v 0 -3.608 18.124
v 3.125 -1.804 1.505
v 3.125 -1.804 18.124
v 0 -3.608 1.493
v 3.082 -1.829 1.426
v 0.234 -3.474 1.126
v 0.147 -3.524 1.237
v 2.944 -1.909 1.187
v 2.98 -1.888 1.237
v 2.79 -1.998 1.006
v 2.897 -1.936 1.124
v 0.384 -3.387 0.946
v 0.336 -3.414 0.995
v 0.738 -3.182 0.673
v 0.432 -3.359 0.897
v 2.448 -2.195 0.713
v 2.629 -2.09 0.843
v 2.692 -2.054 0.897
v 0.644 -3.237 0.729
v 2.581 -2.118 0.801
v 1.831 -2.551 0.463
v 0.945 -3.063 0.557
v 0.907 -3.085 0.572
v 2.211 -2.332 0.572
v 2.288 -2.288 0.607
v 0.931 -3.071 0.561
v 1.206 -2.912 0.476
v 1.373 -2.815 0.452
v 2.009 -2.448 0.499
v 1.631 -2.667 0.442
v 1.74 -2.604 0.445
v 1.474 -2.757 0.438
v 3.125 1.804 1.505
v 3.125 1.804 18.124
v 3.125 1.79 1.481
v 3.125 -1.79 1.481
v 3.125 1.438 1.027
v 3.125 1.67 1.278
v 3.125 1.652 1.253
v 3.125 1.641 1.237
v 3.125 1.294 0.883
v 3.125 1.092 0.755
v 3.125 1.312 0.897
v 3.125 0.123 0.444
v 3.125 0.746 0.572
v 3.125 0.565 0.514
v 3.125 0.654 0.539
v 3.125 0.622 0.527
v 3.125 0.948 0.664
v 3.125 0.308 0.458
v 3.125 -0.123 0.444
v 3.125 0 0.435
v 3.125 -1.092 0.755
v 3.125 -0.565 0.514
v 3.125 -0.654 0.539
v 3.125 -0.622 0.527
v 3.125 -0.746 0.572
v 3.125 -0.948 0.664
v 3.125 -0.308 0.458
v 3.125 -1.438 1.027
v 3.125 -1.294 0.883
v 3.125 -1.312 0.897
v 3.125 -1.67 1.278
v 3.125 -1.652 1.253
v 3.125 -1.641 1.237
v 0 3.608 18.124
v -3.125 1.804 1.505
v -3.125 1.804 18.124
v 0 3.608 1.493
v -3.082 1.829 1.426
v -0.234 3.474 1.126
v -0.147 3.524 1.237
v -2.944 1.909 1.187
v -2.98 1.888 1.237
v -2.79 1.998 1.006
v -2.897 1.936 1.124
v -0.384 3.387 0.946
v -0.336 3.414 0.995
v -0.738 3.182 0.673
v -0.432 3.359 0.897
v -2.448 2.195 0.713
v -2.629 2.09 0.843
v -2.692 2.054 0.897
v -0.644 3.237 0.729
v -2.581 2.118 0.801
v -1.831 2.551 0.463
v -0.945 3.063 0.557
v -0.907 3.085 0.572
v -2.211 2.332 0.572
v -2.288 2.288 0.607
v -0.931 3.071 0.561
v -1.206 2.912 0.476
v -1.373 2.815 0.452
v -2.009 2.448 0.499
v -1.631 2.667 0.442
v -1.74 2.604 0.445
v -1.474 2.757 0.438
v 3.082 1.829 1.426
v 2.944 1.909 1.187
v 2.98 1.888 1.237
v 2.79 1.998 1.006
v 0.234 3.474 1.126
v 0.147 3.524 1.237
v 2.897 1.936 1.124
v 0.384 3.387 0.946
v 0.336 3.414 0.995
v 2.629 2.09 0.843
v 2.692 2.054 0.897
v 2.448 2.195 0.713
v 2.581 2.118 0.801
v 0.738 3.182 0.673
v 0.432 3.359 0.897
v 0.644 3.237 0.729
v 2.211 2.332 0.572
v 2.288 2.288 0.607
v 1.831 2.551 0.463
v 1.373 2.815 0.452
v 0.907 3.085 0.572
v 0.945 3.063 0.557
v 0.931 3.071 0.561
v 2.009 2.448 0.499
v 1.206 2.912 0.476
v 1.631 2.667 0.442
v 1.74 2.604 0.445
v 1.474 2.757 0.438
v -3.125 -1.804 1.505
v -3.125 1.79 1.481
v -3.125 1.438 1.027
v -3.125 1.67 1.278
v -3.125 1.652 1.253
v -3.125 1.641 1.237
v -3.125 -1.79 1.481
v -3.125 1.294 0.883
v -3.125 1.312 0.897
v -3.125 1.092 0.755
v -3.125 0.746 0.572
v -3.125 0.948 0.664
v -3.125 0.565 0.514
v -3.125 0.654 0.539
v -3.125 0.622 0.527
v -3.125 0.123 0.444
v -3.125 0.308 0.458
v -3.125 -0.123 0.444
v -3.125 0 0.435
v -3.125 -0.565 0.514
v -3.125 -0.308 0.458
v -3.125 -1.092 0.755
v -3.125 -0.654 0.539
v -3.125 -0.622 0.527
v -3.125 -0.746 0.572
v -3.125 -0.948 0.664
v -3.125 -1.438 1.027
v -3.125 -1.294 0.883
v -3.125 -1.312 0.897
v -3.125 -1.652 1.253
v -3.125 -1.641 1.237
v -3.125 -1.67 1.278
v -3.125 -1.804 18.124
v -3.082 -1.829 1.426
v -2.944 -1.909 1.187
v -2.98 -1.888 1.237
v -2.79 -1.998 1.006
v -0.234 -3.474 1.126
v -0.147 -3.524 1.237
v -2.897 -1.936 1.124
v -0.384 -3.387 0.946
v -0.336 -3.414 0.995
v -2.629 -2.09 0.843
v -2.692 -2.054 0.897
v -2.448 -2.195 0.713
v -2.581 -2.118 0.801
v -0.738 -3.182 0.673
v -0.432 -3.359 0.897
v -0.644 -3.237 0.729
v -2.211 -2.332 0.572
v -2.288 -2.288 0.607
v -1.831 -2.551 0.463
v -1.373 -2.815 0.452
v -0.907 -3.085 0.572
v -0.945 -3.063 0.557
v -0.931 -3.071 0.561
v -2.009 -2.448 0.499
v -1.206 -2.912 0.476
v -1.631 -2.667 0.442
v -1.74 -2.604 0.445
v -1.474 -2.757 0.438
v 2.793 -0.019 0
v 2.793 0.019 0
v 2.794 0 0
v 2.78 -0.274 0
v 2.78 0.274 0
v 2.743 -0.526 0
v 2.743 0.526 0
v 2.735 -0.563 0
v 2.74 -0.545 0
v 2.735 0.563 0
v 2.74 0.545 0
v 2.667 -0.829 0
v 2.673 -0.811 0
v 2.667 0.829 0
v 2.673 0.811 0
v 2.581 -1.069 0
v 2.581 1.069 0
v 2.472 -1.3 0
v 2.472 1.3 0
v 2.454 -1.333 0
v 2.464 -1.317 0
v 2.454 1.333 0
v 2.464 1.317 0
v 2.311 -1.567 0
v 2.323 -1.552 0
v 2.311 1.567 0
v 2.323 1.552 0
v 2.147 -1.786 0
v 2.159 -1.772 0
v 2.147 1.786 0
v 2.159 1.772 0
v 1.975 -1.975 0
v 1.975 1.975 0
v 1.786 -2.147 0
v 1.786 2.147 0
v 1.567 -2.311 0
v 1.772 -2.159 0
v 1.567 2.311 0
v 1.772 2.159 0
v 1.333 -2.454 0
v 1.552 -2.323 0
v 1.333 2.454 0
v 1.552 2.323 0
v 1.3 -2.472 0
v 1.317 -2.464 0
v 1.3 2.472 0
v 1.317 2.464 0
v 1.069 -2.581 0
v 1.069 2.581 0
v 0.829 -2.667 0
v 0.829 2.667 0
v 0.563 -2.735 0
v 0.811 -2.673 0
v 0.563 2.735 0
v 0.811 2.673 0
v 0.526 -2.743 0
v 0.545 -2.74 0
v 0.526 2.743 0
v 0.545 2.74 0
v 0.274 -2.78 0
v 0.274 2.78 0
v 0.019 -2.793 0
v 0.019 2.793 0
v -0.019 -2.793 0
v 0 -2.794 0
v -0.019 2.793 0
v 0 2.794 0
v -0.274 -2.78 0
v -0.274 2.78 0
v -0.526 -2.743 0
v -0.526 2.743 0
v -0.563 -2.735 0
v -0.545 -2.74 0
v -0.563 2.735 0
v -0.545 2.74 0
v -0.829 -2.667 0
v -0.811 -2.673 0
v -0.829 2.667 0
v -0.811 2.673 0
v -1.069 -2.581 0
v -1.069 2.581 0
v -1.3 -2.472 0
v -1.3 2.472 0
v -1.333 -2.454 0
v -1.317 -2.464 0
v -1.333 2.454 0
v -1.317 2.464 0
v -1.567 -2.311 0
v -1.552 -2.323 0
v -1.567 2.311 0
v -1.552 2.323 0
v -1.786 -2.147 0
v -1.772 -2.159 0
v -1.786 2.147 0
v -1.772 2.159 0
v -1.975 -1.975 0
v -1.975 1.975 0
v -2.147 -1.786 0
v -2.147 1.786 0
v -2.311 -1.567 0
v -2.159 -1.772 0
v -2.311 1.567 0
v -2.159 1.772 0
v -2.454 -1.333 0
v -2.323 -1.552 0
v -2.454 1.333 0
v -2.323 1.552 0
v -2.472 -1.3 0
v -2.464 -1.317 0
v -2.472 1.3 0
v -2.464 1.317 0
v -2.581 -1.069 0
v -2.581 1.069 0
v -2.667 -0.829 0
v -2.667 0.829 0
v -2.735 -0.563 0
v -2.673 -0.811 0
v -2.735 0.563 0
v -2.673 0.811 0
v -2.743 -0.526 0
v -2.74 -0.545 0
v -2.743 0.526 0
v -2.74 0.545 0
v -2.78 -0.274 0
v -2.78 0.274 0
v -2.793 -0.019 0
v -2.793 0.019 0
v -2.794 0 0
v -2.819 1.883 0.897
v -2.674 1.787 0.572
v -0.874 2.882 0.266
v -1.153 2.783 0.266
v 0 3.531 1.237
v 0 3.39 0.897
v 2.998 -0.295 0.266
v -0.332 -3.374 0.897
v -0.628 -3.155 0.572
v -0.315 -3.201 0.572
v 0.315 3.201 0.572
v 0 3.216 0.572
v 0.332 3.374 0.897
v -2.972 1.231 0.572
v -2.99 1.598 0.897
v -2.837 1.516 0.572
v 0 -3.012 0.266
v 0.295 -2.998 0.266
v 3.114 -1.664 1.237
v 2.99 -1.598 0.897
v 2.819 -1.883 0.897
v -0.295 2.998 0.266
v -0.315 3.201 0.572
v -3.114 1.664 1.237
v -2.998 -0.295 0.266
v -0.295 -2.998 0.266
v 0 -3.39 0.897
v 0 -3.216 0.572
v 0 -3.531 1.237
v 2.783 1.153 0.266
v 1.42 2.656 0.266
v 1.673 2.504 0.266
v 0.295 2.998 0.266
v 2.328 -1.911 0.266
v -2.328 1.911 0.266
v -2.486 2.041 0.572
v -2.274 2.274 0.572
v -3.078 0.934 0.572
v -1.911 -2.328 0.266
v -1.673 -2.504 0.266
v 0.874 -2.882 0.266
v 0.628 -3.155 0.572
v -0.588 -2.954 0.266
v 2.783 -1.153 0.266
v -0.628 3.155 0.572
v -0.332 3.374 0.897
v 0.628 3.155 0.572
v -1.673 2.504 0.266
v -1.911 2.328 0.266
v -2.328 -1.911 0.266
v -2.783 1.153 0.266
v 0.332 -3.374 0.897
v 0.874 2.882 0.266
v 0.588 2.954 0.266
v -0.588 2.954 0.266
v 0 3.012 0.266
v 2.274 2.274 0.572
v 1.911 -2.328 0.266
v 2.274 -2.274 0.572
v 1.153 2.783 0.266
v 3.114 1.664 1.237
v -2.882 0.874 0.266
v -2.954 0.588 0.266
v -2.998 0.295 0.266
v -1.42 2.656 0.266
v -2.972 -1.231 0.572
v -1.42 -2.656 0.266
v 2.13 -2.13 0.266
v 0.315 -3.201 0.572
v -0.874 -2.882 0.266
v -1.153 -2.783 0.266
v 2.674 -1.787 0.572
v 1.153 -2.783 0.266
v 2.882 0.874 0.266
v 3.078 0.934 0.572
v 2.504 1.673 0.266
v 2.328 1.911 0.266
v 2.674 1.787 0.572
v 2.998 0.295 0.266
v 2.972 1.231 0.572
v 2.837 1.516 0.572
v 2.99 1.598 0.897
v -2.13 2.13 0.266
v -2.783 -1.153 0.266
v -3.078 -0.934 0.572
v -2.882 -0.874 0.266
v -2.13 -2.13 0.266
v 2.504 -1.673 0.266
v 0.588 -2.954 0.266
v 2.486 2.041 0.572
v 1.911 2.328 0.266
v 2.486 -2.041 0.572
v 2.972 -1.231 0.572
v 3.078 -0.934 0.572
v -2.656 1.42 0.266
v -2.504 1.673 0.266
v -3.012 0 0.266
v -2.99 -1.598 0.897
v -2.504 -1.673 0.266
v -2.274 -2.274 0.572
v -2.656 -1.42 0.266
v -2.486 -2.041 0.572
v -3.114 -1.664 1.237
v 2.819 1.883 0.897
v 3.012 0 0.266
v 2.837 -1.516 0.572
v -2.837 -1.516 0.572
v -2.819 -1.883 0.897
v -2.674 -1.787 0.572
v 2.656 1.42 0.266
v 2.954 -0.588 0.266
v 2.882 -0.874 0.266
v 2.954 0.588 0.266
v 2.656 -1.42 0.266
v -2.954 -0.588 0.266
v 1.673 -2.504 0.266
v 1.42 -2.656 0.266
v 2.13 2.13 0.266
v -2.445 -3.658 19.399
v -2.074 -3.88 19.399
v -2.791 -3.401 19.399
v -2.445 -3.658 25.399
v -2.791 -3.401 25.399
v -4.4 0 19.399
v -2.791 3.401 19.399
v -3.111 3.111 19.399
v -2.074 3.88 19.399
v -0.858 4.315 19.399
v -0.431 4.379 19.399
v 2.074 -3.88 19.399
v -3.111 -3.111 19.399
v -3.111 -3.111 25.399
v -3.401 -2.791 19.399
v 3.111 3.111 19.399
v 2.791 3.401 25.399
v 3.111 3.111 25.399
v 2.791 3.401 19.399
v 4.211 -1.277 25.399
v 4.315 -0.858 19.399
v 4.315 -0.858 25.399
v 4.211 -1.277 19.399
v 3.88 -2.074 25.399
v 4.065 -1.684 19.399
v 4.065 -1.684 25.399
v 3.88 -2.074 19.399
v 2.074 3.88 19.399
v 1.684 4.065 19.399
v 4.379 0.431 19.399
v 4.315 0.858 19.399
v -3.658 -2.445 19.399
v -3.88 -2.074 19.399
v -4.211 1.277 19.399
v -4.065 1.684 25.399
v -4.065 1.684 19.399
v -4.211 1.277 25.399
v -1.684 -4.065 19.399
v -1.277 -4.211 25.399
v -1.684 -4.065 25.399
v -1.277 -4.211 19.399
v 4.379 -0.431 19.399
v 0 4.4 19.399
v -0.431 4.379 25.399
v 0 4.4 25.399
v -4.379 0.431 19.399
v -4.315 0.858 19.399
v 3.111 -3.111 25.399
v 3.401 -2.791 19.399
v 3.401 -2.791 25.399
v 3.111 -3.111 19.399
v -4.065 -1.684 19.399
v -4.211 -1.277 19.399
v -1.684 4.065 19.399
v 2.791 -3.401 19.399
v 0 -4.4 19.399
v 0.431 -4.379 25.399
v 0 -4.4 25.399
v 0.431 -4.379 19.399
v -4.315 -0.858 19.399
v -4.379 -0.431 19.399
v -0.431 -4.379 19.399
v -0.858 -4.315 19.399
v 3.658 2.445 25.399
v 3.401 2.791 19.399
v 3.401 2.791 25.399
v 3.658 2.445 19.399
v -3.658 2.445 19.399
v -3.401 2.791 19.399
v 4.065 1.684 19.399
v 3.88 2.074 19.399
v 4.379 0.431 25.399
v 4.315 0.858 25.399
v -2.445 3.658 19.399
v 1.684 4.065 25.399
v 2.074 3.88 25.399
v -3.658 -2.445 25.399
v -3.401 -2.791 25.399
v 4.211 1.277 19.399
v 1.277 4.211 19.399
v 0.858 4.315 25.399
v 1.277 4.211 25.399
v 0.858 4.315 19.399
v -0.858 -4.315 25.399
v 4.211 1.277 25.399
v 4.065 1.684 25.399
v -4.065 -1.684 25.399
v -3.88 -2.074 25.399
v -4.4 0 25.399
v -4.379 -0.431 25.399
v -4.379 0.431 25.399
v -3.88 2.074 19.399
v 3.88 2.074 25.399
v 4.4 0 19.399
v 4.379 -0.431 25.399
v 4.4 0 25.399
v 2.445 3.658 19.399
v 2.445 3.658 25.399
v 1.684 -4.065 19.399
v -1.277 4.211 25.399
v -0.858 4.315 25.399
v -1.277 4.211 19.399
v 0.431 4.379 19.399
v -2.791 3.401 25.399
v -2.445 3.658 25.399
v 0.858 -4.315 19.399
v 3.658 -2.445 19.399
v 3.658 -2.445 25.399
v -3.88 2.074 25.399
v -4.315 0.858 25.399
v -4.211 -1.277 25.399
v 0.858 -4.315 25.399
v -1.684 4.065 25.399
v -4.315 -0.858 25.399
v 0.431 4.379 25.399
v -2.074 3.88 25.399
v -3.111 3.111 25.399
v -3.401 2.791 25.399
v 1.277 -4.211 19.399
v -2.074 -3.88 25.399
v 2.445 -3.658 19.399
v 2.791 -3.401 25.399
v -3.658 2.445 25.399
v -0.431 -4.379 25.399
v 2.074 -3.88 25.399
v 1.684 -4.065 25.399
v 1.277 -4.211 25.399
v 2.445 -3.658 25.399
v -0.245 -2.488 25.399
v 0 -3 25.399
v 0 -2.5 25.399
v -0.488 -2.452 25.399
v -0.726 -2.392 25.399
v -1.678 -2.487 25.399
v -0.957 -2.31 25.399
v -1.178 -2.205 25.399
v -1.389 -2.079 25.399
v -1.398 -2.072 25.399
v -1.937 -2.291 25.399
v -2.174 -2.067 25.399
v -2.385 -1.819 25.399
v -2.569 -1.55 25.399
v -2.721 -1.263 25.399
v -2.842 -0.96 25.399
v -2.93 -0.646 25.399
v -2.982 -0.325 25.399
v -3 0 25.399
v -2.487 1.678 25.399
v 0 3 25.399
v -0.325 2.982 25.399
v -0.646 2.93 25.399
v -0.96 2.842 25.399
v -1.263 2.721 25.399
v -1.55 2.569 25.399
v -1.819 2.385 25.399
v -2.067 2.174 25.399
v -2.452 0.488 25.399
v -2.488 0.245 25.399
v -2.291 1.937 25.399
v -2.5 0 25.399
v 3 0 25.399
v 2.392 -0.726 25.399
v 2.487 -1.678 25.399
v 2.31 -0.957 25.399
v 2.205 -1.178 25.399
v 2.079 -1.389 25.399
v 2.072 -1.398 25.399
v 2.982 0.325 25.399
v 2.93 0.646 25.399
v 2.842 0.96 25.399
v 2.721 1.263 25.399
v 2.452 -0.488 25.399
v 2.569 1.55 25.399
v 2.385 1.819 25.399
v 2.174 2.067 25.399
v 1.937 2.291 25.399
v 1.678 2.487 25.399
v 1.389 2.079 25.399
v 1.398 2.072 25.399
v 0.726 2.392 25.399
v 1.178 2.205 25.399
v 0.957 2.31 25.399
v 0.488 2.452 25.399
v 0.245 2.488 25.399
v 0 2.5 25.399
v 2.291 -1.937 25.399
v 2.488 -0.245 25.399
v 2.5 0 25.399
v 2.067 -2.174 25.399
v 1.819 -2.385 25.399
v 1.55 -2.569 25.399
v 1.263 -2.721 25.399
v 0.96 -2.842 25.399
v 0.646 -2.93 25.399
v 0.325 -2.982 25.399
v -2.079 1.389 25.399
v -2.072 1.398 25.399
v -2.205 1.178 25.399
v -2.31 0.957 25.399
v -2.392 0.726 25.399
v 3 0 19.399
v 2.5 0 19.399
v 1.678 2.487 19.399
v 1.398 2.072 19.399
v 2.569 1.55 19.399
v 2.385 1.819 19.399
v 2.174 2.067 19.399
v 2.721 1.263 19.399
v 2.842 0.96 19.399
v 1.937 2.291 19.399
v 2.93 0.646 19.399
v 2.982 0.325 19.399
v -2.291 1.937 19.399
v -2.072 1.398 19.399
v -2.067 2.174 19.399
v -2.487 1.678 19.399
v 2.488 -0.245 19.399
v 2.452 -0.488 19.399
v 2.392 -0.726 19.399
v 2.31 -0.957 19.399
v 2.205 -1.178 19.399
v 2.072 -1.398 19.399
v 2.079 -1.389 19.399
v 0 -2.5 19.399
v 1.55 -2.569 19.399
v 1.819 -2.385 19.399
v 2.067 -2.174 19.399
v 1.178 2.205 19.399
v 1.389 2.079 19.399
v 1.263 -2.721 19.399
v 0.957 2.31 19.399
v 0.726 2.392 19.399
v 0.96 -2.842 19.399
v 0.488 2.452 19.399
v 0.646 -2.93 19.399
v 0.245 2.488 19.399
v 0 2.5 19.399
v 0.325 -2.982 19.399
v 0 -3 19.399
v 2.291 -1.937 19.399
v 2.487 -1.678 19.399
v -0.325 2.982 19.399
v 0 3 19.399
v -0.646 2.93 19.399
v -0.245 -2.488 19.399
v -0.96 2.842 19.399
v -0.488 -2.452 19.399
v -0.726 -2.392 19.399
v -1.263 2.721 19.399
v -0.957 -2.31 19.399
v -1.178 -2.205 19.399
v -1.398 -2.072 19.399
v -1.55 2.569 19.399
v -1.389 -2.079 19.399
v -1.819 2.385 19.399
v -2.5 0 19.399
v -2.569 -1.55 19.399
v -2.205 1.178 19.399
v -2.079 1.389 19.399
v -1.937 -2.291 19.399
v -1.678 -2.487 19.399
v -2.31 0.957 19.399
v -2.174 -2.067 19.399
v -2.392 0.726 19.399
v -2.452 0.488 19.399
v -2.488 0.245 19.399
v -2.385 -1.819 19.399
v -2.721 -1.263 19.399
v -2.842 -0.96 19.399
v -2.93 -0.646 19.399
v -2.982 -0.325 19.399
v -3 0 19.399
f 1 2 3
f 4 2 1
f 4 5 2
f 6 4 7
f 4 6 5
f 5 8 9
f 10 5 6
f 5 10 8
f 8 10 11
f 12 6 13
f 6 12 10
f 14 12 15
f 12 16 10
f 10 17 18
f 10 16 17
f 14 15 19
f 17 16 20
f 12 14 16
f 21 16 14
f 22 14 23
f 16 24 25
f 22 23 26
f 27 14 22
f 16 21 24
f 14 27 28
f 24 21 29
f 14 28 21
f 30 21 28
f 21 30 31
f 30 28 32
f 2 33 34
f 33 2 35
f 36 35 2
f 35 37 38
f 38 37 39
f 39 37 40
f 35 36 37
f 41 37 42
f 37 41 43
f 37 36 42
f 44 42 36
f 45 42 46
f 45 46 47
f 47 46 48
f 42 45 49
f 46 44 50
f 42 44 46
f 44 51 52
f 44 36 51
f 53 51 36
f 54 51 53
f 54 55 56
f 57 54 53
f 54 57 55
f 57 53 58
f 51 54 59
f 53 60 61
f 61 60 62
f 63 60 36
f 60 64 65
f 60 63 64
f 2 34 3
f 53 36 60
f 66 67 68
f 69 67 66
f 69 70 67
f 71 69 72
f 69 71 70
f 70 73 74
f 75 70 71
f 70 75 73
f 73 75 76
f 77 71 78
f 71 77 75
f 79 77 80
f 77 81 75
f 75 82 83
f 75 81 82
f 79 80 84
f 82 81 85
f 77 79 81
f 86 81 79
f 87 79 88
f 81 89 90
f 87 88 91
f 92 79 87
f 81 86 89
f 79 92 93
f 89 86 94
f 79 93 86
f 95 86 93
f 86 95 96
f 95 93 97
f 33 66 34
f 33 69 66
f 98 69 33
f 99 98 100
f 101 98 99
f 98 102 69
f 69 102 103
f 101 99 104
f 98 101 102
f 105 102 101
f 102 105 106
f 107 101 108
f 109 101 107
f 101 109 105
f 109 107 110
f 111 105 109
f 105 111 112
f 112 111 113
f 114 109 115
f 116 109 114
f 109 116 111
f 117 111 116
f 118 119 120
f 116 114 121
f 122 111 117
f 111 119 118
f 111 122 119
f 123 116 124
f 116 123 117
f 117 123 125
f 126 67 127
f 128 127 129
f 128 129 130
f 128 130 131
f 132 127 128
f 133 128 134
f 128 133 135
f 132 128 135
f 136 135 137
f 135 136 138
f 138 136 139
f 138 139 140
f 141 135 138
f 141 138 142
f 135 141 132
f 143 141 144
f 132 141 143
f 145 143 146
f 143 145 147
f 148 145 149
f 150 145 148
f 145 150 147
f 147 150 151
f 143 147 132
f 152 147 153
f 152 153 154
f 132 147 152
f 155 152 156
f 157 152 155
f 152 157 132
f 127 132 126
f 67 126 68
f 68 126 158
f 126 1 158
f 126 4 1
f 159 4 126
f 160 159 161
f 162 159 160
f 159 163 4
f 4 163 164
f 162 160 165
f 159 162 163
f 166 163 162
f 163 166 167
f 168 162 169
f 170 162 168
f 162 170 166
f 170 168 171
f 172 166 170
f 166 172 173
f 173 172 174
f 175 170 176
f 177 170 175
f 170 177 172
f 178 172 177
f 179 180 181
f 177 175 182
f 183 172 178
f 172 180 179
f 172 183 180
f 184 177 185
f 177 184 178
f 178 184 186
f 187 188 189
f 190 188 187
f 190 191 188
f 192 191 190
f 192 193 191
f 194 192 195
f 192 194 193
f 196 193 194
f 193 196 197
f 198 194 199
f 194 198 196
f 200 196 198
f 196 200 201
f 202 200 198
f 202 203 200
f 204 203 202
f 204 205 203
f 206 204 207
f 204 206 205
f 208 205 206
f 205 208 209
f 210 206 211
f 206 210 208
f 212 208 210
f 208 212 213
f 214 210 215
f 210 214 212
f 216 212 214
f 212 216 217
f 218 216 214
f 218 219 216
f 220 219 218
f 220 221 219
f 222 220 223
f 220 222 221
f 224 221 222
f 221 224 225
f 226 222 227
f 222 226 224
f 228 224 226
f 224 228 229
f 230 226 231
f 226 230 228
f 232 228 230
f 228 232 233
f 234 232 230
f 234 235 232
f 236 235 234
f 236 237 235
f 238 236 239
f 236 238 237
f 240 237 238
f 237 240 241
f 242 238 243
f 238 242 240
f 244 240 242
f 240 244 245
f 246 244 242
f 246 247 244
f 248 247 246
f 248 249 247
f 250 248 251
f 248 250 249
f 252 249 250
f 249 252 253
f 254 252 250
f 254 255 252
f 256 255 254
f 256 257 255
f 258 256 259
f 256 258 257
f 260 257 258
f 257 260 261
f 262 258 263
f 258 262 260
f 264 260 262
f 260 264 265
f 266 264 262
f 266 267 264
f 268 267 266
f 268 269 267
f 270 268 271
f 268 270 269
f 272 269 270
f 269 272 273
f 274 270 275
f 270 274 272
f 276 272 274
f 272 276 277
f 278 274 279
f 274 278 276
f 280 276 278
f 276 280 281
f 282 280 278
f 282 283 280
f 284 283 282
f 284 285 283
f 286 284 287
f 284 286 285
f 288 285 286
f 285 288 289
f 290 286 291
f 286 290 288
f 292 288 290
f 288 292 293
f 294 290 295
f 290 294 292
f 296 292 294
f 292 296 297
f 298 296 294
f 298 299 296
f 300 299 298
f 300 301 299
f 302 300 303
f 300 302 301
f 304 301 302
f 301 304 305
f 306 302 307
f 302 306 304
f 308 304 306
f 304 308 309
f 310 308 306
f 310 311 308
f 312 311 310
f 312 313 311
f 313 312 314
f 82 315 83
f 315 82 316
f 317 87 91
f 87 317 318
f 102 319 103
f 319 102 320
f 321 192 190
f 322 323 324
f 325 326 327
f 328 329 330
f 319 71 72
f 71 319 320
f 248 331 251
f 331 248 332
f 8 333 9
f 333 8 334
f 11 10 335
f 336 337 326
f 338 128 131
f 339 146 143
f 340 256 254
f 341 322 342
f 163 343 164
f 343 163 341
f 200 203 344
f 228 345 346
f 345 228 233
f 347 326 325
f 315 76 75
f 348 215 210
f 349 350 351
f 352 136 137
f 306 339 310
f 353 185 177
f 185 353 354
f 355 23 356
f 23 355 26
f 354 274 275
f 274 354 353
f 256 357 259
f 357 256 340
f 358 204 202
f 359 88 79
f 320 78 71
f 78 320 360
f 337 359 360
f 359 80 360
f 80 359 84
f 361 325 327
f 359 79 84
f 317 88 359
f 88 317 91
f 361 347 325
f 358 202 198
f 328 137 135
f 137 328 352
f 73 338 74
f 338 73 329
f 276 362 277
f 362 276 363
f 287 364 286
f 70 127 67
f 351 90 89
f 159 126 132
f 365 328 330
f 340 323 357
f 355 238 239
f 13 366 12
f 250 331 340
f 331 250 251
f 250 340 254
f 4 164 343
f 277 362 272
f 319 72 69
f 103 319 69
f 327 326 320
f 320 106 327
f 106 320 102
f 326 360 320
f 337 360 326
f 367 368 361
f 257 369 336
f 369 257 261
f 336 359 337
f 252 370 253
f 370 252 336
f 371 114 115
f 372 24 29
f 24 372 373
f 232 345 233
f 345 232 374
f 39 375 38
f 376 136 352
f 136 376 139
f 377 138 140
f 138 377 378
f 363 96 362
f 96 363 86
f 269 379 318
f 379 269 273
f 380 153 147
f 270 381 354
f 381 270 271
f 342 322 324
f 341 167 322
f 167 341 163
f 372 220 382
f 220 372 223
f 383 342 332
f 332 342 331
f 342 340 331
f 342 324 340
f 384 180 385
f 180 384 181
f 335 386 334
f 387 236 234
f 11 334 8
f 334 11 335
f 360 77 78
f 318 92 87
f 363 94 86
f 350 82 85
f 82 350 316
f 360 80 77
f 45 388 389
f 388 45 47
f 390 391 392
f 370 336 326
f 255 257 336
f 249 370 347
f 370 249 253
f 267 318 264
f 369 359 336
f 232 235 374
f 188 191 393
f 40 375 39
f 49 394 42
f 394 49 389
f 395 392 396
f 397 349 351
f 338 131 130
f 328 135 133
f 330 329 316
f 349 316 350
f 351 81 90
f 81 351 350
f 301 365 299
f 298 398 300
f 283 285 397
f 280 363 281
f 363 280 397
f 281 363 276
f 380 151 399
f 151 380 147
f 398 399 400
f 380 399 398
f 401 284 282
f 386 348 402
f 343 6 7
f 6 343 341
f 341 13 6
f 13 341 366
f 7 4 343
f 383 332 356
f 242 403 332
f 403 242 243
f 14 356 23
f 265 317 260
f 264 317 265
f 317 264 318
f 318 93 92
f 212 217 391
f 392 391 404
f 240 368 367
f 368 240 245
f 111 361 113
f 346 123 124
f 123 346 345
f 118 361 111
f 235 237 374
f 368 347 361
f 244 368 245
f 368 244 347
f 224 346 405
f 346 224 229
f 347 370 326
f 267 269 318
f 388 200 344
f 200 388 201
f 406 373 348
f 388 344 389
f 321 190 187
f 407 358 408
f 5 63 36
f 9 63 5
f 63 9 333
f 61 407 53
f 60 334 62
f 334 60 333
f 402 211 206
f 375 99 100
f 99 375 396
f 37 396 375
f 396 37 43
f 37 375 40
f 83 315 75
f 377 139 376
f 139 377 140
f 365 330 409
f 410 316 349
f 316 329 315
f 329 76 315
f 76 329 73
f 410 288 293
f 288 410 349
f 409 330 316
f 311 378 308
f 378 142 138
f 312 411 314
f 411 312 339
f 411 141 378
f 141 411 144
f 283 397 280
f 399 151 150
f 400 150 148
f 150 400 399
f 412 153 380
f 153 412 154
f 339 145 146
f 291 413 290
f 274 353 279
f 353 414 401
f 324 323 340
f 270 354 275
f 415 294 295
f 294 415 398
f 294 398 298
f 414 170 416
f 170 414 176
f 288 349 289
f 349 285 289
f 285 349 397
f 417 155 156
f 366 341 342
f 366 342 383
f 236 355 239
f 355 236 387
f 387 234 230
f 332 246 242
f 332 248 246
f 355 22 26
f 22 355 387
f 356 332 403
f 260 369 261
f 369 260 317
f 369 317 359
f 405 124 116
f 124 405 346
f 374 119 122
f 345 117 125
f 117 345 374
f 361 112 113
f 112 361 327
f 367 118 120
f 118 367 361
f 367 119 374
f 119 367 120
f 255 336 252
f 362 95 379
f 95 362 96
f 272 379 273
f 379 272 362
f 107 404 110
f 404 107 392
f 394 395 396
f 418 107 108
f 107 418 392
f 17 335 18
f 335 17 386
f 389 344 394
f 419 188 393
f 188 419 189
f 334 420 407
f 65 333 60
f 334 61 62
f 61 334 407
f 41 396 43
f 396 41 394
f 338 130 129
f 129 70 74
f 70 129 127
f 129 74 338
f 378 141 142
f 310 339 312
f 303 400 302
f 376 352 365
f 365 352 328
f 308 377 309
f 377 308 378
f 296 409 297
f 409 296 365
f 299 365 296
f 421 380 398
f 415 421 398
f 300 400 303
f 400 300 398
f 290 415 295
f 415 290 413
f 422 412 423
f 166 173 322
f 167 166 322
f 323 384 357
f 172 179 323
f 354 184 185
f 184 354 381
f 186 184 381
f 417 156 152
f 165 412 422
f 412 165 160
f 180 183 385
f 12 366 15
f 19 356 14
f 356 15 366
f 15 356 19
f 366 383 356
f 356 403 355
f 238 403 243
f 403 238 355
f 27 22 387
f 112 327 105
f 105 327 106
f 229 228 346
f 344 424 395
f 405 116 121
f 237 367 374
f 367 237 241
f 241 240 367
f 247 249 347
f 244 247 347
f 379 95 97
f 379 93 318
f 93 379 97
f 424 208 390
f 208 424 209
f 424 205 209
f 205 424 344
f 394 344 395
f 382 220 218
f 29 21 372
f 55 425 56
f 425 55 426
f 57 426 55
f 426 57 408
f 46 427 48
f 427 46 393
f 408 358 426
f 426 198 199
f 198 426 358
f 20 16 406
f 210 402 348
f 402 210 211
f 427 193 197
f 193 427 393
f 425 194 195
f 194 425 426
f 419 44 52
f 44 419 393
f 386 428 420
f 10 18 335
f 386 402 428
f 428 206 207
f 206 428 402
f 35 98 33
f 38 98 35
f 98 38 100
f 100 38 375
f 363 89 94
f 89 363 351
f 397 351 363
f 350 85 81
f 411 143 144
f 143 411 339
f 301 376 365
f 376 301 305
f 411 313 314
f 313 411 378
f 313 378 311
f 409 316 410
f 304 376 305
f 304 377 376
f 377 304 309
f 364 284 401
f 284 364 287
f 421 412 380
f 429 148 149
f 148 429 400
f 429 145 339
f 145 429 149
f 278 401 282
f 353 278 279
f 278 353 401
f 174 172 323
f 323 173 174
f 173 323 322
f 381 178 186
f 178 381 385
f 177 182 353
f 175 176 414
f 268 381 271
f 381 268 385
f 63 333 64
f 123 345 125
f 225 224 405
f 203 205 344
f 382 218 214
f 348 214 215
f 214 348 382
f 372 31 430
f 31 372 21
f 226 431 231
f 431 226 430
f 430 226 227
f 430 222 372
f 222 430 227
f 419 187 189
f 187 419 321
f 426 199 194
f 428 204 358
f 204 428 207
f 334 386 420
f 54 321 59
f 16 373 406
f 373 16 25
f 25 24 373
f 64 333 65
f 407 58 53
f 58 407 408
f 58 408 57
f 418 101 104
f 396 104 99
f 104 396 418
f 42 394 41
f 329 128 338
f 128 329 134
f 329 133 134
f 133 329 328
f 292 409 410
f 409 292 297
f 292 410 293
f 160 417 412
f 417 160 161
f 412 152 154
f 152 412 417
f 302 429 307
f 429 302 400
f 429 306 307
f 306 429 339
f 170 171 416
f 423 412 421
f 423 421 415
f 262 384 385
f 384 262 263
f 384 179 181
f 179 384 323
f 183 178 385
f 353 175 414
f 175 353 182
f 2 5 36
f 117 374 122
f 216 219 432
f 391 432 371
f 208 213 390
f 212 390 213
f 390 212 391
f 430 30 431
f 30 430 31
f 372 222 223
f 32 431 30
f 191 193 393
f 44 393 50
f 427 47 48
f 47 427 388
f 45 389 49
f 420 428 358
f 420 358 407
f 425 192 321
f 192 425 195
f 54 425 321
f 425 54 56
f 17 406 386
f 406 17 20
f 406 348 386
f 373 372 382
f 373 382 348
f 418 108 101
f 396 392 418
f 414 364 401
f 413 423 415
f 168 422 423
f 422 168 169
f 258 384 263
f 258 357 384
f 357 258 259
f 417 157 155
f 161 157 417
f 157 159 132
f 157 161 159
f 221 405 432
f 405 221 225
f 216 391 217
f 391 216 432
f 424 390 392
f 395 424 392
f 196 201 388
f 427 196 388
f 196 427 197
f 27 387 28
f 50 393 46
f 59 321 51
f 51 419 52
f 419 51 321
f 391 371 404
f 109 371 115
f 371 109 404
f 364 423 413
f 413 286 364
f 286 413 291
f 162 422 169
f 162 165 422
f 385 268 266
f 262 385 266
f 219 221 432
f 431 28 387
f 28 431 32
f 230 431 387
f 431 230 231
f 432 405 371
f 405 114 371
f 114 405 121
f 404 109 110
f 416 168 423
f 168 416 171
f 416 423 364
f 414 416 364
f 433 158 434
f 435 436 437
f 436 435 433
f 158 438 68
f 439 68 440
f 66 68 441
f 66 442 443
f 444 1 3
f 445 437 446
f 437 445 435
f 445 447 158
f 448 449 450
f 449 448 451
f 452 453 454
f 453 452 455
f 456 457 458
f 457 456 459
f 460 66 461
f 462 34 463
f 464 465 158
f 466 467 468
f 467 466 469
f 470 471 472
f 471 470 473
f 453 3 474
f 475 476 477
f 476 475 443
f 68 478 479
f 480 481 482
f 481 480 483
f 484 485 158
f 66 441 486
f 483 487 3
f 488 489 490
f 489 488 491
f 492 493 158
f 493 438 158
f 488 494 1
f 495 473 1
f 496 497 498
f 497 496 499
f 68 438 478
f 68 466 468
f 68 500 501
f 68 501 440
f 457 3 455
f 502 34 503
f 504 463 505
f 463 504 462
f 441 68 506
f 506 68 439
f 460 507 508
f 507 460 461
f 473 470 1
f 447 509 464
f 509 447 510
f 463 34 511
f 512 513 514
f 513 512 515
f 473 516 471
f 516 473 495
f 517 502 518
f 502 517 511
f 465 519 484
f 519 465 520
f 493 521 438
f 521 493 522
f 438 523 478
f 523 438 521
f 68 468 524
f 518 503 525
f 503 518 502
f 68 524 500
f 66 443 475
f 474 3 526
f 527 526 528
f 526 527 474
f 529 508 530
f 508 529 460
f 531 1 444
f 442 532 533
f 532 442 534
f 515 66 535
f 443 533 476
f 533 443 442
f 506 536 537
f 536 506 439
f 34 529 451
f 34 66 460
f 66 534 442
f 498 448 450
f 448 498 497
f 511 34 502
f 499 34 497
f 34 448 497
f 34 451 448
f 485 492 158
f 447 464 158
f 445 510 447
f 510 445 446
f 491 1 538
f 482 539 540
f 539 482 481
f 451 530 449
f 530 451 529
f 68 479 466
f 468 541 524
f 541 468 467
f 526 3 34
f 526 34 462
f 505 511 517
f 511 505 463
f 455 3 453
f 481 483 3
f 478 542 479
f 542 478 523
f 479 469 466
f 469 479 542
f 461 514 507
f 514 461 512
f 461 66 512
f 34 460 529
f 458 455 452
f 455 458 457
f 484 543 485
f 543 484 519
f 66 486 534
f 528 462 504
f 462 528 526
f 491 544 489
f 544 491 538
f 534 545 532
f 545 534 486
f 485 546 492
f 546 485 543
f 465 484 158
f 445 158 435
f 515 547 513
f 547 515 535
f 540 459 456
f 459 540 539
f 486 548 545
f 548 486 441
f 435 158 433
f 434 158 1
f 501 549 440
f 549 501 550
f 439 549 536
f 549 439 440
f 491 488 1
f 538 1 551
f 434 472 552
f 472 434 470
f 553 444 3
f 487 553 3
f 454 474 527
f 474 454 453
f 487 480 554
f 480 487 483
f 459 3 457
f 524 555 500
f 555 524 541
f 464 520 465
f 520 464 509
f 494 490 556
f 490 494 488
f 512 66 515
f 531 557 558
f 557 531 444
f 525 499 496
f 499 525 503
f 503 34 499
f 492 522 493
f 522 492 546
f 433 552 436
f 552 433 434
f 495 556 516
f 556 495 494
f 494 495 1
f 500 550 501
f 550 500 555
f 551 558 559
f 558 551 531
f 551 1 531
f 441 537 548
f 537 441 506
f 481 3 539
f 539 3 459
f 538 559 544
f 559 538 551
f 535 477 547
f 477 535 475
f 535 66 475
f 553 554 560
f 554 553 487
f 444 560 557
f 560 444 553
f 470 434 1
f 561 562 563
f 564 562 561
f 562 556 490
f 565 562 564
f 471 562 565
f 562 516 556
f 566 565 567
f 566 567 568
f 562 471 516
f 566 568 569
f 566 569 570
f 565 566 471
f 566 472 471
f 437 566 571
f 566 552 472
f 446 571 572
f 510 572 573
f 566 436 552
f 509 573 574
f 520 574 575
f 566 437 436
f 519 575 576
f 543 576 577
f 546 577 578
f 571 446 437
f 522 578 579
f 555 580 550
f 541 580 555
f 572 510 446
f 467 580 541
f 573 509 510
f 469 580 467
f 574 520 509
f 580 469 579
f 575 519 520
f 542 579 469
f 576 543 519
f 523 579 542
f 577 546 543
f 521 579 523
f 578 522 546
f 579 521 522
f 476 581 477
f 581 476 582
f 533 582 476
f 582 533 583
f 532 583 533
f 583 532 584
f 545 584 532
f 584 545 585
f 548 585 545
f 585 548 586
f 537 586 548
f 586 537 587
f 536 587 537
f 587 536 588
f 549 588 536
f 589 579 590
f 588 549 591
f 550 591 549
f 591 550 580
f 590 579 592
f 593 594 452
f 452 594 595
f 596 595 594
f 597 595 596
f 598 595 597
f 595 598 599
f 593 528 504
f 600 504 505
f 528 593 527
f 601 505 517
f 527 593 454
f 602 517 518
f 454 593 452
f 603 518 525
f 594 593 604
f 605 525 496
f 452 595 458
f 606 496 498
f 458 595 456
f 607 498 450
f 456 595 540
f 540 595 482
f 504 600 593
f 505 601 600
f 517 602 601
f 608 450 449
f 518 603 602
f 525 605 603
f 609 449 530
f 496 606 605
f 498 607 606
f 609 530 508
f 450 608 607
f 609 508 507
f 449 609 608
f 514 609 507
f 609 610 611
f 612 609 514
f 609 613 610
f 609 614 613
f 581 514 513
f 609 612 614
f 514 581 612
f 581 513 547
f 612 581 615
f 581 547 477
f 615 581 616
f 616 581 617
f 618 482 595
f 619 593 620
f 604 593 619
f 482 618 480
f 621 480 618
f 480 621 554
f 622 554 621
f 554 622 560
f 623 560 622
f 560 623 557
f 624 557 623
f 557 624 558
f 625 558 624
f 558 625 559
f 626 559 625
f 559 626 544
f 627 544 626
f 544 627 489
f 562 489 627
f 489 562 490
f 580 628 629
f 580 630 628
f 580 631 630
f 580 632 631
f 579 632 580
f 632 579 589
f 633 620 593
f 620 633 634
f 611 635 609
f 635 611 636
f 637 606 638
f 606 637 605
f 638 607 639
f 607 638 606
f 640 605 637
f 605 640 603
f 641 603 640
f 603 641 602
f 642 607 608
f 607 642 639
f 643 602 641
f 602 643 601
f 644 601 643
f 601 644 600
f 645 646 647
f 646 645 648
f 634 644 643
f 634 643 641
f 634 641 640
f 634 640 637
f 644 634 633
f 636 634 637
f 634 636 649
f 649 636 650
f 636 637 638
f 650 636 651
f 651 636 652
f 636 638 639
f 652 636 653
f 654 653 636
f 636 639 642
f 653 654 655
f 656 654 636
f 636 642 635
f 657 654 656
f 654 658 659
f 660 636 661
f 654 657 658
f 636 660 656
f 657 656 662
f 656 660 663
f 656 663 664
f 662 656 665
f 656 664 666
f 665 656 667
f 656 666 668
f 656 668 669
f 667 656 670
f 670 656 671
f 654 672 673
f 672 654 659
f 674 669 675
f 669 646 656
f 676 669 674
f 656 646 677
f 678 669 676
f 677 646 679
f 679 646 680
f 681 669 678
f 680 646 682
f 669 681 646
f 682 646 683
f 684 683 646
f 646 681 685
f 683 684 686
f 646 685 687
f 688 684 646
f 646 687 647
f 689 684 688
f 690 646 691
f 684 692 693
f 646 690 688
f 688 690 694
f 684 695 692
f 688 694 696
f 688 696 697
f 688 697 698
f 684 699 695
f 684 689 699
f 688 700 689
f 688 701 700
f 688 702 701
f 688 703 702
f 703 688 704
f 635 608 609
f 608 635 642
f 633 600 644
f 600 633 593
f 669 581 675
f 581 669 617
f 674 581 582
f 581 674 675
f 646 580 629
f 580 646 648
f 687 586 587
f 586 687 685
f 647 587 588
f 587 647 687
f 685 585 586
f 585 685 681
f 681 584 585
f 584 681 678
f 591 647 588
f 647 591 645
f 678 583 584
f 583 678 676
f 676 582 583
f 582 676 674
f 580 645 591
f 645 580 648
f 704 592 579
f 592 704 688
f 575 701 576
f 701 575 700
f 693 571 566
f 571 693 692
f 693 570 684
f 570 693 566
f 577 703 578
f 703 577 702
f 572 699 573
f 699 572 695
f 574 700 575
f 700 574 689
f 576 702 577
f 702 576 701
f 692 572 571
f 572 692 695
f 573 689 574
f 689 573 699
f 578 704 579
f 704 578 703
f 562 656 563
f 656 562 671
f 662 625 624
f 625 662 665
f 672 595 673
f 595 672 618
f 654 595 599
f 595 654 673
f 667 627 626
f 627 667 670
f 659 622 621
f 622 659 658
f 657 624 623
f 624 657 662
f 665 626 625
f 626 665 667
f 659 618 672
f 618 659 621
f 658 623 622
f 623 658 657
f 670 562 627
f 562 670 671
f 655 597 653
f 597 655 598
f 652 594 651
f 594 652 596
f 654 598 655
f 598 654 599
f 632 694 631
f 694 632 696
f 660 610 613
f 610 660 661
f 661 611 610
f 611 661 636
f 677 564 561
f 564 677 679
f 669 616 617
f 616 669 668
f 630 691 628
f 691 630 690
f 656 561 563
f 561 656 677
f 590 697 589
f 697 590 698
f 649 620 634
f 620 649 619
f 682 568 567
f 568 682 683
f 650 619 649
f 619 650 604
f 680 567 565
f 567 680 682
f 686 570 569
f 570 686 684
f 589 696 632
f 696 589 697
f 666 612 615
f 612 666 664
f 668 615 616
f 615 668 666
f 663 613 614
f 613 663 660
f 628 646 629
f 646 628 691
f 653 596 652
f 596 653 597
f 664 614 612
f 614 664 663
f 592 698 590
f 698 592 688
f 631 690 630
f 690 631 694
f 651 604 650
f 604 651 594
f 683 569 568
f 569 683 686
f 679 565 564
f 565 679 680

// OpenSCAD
/*
 * Hex screwdriver bit to adjust focus of raspberry pi camera v2.
 * Adjust clearance_fit so bit measures 6.31-6.35mm, 0.2485-0.25" across flats.
 */

eps1 = 0.001;
$fn = 64;
clearance_fit = 0.1; // Increase if hex bit does not fit screwdriver, decrease if hex bit waggles.

// to fit camera lens
driver_dia1 = 8.8;
driver_dia2 = 6.0;
driver_dia3 = 5.0;
driver_h = 6.0;
driver_segment_angle = 56.0;

bit_dia = 25.4/4 - clearance_fit; // 1/4" - tweak for printing
transition_h = (driver_dia1 - bit_dia) / 2 ; // height of transition region between hex shank and round driver
bit_h = 25.4 - driver_h - transition_h; // total height 25.4mm = 1"

module focus_screwdriver() {
    difference() {
        focus_screwdriver_body();
        focus_screwdriver_holes();
    }
}

module focus_screwdriver_body() {
    hull() {
        translate([0, 0, bit_h + transition_h - eps1])
        cylinder(h = driver_h, d = driver_dia1);
        
        translate([0, 0, bit_h - eps1])
        cylinder_outer(h = transition_h, d = bit_dia, fn = 6);
    }
    
    intersection() {
        cylinder_outer(h = bit_h, d = bit_dia, fn = 6);
        
        hull() {
            translate([0, 0, bit_h])
            cylinder(d = 7.5, h = eps1);
            translate([0, 0, 2.5])
            sphere(d = 7.5);
        }
    }
}

module focus_screwdriver_holes() {
       
    translate([0, 0, bit_h + transition_h - eps1]) {
        cylinder(h = bit_h, d = driver_dia3);
            
        circ_array(4)
        rotate_extrude(angle = driver_segment_angle, convexity = 10)
        square([driver_dia2/2, driver_h + eps1]);
    }
}


// create n copies, rotated over 360/n degrees

module circ_array(copies) {
    for (i = [0:1:copies-1])
        rotate([0, 0, 360/copies * i])
        children();
}

/* circumscribed (outer) cylinders */

module cylinder_outer(h = 0, r = 0, d = 0, fn = $fn) {
   fudge = 1/cos(180/fn);
   rotate([0, 0, 180/fn])
   if (r == 0) cylinder(h=h, d=d*fudge, $fn=fn);
   else cylinder(h=h, r=r*fudge, $fn=fn);
}

focus_screwdriver();

// not truncated
